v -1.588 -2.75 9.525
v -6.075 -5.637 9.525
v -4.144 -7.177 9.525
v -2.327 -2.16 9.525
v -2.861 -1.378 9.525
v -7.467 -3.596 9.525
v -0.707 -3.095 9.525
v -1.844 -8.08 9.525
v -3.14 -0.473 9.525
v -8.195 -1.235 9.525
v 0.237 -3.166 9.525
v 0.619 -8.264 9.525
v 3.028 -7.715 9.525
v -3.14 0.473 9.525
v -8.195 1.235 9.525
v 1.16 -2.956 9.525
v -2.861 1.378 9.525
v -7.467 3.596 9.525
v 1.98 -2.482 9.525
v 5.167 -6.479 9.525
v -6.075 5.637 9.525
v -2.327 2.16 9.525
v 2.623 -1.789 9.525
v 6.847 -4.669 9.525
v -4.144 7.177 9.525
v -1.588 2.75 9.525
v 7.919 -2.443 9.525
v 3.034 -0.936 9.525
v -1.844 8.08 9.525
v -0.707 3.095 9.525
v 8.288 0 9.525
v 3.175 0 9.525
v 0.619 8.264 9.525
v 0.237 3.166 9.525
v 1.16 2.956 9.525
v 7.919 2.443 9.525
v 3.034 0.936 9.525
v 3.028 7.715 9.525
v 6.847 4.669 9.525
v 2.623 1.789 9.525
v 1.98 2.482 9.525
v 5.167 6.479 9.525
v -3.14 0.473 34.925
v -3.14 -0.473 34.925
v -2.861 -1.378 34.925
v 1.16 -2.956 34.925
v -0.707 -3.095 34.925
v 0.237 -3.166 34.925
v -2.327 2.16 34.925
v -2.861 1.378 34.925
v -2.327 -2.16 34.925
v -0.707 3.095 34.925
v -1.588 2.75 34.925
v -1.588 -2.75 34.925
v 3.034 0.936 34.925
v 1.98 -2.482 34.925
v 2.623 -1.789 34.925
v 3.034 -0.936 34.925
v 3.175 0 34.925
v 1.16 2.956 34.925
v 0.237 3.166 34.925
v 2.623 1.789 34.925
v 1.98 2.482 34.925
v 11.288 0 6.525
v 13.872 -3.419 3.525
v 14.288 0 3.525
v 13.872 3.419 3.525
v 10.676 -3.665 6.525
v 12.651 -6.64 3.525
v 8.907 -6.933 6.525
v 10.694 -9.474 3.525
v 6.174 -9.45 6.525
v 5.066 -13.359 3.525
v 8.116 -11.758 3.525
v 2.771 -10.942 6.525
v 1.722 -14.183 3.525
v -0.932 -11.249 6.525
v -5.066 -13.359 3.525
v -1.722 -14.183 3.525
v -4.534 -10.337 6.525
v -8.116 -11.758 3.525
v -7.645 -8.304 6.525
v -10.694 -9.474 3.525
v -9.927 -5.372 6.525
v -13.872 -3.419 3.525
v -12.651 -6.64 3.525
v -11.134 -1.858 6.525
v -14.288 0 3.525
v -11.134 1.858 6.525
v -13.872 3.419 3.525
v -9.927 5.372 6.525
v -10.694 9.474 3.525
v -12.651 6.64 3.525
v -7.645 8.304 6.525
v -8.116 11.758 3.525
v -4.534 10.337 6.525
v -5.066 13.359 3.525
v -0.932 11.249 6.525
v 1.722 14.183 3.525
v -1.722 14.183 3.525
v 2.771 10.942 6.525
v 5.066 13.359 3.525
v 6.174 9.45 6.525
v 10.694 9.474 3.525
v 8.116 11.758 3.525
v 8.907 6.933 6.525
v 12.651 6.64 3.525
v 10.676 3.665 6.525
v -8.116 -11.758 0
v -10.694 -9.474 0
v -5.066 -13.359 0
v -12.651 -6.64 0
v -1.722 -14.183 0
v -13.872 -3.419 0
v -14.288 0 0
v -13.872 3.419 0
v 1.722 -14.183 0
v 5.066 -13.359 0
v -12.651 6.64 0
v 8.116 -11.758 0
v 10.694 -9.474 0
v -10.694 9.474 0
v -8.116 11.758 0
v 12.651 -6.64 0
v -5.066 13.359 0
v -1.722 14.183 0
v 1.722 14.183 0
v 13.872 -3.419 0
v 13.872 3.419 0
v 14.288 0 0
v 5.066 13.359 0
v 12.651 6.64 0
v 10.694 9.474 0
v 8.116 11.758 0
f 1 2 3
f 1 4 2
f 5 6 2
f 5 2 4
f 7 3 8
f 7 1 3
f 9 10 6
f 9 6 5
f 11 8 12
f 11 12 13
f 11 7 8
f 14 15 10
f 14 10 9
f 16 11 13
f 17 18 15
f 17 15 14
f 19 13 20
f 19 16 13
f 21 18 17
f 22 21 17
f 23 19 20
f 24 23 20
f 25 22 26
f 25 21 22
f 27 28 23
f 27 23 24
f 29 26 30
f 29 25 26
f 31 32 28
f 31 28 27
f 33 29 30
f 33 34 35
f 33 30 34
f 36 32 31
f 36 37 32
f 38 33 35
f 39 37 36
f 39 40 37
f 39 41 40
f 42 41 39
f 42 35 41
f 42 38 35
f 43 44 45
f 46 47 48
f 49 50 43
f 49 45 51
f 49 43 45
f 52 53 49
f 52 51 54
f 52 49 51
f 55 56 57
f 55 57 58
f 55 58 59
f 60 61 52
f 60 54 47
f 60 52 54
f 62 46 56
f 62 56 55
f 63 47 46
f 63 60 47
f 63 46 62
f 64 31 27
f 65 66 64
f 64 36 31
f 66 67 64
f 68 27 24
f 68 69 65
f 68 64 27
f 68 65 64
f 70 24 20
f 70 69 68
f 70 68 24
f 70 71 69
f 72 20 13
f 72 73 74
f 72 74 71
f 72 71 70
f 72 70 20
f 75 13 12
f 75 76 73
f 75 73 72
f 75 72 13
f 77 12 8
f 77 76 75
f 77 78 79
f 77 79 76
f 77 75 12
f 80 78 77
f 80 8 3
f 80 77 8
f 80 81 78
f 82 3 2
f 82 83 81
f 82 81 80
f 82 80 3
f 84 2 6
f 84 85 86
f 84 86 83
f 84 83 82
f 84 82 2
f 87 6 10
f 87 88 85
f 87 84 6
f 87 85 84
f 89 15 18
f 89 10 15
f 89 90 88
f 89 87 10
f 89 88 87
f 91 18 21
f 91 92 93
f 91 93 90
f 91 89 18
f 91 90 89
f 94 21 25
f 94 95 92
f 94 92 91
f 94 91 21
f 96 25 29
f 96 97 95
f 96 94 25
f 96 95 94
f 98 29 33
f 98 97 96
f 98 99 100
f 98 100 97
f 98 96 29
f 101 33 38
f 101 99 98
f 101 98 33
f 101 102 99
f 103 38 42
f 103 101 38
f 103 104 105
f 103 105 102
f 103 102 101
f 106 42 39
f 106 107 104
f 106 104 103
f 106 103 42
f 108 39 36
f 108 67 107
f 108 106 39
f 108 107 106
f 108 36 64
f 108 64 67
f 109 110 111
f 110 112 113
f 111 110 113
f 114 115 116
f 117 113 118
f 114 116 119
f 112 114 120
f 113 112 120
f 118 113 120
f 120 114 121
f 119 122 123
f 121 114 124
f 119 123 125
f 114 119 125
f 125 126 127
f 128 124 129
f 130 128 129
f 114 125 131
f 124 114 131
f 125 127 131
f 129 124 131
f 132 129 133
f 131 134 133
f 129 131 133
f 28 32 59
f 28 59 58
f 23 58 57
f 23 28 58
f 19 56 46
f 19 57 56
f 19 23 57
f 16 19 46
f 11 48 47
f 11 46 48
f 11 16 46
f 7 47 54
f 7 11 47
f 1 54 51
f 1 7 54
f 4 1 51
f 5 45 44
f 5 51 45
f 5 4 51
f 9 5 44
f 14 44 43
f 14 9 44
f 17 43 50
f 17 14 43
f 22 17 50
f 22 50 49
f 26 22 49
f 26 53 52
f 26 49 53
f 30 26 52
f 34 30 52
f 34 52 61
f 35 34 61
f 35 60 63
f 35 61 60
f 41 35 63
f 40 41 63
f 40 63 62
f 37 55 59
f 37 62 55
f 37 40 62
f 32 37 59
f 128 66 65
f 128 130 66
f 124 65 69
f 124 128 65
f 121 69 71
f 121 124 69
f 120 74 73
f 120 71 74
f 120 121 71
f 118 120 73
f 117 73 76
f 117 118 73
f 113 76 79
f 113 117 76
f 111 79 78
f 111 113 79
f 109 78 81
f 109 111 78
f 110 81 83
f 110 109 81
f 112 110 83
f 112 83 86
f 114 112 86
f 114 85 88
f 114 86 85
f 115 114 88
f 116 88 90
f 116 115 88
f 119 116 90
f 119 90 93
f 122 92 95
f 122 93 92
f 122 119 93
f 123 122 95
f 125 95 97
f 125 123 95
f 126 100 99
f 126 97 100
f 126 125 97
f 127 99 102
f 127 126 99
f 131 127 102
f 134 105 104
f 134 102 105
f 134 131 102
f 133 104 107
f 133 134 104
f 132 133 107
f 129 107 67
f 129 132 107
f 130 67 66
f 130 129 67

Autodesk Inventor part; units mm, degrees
ref_plane "YZ Plane" through (0, 0, 0) normal (1, 0, 0) x (0, 1, 0)
ref_plane "XZ Plane" through (0, 0, 0) normal (0, 1, 0) x (-1, 0, 0)
ref_plane "XY Plane" through (0, 0, 0) normal (0, 0, 1) x (1, 0, 0)
sketch "Sketch1" plane through (0, 0, 0) normal (0, 0, 1) x (1, 0, 0)
  circle A0 centre (0, 0) radius 14.2875
  dimension "d0" = 28.575
extrude "Extrusion1" add sketch "Sketch1" along normal blind 9.525
sketch "Sketch2" plane through (0, 0, 9.525) normal (0, 0, 1) x (1, 0, 0)
  circle A0 centre (0, 0) radius 14.2875 projected
  circle A1 centre (0, 0) radius 3.175
  dimension "d4" = 6.35
extrude "Extrusion2" add sketch "Sketch2" along normal blind 25.4 contours A1
chamfer "Chamfer1" distance 6 angle 45 1 edges at (-14.2875, 0, 9.525)
thread "Thread1" size "1/4-20 UNC" class "2A" standard "ANSI Unified Screw Threads" full length
properties part number "23015T82"
